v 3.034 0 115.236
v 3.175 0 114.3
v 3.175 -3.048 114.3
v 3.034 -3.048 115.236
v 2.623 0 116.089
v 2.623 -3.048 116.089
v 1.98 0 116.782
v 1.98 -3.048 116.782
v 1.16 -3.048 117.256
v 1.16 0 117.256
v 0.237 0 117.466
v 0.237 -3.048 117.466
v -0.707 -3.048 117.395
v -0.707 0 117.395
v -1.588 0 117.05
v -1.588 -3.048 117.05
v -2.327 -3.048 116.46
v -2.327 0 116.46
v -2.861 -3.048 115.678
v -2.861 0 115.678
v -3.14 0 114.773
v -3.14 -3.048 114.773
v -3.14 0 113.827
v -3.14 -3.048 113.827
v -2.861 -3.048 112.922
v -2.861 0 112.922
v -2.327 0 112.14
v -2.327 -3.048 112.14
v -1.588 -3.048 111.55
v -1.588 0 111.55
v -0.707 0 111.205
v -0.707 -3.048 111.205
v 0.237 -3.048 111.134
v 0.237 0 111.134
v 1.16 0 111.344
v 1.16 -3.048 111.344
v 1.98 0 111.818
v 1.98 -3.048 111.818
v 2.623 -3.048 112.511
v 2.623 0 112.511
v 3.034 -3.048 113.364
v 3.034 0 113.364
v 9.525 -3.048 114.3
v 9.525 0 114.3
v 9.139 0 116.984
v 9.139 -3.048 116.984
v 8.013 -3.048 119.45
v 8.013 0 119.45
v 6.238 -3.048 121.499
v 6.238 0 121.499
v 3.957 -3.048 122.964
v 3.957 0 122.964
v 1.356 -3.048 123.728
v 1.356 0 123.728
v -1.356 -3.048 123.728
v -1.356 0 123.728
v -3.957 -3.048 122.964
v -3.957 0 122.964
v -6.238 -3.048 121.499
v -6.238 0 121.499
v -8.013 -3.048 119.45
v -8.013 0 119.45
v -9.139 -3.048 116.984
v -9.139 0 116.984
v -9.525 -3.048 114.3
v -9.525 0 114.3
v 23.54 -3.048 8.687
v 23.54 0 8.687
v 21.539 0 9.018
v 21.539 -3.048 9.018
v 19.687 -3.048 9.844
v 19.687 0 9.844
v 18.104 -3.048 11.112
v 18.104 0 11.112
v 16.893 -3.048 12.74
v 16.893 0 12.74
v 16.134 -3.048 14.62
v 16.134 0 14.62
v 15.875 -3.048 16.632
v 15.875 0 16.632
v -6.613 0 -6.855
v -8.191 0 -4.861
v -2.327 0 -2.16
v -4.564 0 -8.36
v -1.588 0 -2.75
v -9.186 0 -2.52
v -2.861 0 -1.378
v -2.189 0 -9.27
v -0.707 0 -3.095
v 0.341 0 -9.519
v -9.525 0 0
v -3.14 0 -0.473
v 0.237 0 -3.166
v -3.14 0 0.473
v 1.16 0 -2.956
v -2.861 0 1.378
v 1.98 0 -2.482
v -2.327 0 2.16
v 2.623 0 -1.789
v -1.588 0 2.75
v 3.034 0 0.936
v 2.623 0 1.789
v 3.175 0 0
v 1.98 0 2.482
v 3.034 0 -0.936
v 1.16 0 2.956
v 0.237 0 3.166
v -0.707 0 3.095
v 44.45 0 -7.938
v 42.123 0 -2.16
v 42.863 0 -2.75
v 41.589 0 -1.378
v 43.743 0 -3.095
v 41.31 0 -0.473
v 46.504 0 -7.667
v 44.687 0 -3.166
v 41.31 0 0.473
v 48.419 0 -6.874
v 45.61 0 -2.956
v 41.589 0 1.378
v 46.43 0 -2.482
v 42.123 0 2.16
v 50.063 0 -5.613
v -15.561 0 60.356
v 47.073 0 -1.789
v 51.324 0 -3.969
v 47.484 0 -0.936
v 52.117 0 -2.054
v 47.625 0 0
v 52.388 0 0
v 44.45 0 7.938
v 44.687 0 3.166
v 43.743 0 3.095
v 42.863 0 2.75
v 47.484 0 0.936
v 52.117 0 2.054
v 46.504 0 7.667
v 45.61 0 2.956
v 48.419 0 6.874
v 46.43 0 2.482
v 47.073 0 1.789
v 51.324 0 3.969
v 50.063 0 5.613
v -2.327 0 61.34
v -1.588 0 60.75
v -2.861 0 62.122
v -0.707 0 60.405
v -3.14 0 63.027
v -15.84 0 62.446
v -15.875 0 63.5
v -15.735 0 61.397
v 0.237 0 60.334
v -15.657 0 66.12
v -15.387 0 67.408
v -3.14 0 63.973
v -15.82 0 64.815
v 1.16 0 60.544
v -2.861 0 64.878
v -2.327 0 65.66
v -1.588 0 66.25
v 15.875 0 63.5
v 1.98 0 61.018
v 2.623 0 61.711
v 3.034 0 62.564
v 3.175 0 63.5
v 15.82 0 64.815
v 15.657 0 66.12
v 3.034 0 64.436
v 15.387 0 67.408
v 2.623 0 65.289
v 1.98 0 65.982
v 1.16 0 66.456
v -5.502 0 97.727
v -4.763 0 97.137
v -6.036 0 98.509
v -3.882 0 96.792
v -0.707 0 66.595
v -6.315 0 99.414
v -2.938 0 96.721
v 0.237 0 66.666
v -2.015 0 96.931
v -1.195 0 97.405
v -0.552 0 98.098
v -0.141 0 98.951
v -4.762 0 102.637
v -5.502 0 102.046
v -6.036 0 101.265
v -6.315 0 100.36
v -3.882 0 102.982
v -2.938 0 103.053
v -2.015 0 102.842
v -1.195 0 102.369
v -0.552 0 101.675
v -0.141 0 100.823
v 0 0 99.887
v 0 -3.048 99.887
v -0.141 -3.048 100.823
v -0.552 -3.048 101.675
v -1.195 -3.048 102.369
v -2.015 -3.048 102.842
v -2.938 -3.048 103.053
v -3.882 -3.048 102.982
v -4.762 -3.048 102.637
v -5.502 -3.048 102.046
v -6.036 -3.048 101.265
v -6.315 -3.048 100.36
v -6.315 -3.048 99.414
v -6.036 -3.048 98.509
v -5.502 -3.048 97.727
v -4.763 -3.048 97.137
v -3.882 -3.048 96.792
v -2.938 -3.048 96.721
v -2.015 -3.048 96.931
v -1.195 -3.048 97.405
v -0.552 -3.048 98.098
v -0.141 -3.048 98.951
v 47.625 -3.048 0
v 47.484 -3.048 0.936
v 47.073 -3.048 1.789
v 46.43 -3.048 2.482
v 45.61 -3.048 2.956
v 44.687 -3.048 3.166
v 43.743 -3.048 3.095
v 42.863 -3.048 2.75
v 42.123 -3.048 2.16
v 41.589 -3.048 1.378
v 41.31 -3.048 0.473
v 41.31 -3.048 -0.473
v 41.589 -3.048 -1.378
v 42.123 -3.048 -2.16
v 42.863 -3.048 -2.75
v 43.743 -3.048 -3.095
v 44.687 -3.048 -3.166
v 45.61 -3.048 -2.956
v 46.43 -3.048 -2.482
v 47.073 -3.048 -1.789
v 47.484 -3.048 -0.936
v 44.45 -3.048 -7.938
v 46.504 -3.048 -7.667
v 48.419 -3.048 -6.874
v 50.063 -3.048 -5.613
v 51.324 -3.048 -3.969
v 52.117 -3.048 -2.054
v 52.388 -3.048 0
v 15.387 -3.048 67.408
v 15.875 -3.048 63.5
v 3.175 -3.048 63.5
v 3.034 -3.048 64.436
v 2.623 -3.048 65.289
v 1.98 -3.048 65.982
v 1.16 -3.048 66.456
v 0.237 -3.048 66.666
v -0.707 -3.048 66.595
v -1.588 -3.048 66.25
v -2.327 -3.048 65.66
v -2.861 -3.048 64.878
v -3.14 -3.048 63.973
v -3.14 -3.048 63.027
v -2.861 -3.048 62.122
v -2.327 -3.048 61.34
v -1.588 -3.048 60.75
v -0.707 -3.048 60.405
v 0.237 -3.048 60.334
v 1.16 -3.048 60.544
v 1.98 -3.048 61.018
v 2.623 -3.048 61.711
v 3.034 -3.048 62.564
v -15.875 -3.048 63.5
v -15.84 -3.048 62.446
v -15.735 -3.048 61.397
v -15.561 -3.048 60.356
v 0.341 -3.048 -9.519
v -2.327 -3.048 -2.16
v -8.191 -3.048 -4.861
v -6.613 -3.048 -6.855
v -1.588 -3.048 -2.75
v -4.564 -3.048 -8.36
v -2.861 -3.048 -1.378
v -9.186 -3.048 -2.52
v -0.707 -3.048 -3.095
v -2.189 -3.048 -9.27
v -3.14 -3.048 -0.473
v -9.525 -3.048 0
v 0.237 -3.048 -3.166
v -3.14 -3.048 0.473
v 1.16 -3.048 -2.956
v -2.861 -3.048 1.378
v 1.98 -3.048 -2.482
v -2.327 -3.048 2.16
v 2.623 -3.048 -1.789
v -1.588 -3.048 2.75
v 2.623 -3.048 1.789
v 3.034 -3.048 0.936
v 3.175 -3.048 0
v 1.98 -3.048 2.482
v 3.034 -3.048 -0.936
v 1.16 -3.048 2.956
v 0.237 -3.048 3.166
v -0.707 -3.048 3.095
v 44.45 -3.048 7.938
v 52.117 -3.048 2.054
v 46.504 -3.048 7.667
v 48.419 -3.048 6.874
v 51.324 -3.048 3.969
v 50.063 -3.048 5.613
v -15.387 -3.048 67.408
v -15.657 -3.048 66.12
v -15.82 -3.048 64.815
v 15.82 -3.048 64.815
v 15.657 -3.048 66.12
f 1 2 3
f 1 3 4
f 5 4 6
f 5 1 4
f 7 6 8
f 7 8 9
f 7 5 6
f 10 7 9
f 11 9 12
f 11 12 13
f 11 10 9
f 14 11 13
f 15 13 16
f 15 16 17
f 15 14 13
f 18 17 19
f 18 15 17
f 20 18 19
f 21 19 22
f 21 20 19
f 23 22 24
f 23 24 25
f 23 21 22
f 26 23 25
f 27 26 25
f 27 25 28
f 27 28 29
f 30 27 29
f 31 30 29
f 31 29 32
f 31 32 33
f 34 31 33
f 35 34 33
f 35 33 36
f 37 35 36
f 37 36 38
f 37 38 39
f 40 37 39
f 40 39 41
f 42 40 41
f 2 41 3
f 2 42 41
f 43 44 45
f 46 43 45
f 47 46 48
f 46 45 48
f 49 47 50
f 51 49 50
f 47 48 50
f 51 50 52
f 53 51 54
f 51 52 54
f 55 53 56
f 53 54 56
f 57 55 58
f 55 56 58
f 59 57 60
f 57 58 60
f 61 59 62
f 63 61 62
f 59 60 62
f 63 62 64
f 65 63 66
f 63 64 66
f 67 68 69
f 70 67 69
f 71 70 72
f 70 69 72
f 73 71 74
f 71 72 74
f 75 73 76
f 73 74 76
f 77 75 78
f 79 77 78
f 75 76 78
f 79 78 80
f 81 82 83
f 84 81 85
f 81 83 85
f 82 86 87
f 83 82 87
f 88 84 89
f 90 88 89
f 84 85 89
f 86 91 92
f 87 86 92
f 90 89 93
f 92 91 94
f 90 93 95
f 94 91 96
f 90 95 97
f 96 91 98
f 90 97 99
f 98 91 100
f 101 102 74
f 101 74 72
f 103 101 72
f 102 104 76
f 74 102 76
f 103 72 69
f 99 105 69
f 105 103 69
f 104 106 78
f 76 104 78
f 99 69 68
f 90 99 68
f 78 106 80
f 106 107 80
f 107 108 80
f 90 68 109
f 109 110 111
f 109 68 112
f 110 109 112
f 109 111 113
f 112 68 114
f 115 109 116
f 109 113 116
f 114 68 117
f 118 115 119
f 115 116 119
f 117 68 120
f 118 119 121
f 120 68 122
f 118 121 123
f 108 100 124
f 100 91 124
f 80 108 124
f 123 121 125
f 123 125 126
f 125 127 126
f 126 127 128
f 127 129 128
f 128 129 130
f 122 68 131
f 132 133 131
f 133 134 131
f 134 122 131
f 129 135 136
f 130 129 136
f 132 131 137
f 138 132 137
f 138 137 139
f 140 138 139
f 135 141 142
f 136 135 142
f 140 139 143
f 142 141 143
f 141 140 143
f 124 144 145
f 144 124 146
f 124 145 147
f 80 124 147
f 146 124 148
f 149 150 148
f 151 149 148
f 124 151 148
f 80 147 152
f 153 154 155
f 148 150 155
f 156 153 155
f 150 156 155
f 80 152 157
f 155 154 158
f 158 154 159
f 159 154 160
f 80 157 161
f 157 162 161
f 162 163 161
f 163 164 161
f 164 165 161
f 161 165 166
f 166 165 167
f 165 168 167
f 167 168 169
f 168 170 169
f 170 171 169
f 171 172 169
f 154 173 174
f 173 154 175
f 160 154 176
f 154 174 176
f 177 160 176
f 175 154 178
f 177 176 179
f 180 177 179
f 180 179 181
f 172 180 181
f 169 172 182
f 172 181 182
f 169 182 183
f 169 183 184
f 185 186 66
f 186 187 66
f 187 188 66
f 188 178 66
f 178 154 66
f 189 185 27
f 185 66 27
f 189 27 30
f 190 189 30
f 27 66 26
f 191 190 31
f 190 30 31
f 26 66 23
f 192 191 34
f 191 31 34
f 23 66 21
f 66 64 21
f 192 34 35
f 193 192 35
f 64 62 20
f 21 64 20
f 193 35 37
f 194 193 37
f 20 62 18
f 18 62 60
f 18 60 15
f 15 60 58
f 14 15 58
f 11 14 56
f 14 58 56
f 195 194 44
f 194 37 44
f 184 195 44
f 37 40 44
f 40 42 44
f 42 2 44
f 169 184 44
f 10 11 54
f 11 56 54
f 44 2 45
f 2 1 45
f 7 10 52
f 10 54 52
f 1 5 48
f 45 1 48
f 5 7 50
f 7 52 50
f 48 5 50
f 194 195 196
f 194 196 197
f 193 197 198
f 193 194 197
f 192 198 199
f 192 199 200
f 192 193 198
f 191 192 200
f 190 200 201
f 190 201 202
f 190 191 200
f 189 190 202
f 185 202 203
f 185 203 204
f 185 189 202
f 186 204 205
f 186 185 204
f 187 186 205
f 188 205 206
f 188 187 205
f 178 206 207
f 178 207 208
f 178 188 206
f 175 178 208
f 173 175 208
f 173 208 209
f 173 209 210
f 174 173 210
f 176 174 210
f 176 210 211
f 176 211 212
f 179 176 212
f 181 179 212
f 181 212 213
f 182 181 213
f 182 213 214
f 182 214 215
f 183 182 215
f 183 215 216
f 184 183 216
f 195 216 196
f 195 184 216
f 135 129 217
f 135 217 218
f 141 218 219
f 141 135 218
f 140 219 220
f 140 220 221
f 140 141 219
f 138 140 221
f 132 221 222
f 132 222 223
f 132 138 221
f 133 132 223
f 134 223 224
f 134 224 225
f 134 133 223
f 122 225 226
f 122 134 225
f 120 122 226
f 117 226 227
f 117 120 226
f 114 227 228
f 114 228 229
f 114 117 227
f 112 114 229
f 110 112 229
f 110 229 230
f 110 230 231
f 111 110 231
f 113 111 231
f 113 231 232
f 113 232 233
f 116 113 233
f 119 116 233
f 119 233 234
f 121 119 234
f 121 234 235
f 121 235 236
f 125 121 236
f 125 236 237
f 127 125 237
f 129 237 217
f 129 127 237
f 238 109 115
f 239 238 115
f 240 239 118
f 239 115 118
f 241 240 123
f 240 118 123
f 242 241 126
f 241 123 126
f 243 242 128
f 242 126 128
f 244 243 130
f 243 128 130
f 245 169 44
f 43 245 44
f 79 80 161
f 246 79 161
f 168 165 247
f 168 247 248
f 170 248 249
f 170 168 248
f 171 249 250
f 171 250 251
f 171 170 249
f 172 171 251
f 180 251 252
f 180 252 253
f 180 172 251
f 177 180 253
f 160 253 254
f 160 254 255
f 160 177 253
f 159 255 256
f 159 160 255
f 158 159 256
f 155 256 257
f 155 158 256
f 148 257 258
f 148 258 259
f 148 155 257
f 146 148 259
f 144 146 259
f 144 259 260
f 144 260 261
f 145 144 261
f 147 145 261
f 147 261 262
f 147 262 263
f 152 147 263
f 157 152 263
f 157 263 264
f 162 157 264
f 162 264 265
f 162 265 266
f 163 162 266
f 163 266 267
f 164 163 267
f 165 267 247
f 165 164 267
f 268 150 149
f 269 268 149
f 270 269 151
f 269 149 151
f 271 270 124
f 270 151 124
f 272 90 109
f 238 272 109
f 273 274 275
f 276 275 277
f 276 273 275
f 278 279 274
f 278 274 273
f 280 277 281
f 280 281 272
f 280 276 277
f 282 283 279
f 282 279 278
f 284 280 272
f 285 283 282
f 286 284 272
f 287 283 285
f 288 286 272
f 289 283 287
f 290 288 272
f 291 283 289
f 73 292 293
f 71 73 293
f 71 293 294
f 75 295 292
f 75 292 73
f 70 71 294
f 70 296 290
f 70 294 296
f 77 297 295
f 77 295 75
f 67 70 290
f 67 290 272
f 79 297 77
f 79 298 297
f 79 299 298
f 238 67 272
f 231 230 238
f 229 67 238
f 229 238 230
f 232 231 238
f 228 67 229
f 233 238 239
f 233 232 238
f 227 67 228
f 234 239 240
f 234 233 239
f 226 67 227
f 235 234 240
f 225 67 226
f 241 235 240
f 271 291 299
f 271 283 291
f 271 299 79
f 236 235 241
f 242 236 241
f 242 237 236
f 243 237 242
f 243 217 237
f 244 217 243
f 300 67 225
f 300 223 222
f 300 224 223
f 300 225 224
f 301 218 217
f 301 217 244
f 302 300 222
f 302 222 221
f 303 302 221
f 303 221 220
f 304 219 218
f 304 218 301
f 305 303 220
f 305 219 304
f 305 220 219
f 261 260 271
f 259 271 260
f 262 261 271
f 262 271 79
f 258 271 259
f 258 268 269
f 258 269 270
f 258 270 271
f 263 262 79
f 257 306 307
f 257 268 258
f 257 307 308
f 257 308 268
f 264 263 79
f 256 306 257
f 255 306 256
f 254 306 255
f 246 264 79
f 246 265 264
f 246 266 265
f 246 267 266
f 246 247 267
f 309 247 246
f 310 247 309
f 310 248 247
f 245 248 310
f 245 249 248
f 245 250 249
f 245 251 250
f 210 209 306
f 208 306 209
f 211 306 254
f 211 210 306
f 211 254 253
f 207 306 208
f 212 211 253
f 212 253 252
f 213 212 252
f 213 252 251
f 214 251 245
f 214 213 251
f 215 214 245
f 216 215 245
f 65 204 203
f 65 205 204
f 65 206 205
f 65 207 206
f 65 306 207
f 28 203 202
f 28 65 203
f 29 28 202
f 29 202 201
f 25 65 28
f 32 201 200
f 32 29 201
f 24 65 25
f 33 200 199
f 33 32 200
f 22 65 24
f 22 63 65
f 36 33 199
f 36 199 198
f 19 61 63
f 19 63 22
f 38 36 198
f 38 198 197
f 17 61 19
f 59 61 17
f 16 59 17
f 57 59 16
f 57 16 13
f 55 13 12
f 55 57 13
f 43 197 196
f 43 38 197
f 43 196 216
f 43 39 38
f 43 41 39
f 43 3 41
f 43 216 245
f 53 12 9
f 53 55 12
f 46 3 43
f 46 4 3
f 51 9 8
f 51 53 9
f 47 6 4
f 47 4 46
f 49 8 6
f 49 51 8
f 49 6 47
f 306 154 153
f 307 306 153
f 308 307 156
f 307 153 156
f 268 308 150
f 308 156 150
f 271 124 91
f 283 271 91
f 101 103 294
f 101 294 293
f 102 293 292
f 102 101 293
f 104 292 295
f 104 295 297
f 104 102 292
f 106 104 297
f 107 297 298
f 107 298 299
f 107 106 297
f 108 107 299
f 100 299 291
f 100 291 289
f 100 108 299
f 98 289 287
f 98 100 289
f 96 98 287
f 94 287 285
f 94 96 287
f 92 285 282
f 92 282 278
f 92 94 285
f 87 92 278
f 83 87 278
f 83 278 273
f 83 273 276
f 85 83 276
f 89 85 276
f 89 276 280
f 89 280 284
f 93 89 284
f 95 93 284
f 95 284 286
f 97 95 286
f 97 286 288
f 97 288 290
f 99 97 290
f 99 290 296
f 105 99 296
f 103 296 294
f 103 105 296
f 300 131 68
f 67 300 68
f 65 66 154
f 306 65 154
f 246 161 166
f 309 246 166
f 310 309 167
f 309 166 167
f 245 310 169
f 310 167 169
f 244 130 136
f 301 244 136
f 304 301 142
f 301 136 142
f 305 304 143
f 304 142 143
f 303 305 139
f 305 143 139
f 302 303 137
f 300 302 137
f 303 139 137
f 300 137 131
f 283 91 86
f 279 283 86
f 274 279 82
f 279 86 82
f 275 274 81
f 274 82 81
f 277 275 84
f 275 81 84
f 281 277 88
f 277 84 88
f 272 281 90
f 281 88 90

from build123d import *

# Parameters (mm, degrees)
F0_R     = 3.175
F1_DEPTH = 3.048


with BuildPart() as f1:
    # F0 (on Front) → F1 (new body)
    with BuildSketch(Plane.XZ):
        with BuildLine():
            ThreePointArc((-9.525, 114.3), (0, 104.775), (9.525, 114.3))
            ThreePointArc((9.525, 114.3), (0, 123.825), (-9.525, 114.3))
        make_face()
        with Locations((0, 114.3)):
            Circle(F0_R, mode=Mode.SUBTRACT)
        with BuildLine():
            Line((15.3865384615, 67.4076923077), (9.525, 114.3))
            ThreePointArc((9.525, 114.3), (0, 104.775), (-9.525, 114.3))
            Line((-9.525, 114.3), (-15.3865384615, 67.4076923077))
            ThreePointArc((-15.3865384615, 67.4076923077), (0, 79.375), (15.3865384615, 67.4076923077))
        make_face()
        with Locations((-3.175, 99.886942851)):
            Circle(F0_R, mode=Mode.SUBTRACT)
        with BuildLine():
            Line((15.875, 63.5), (15.3865384615, 67.4076923077))
            ThreePointArc((15.3865384615, 67.4076923077), (0, 79.375), (-15.3865384615, 67.4076923077))
            Line((-15.3865384615, 67.4076923077), (-15.875, 63.5))
            Line((-15.875, 63.5), (-15.5606435644, 60.3564356436))
            ThreePointArc((-15.5606435644, 60.3564356436), (1.5796215395, 47.7037846054), (15.875, 63.5))
        make_face()
        with Locations((0, 63.5)):
            Circle(F0_R, mode=Mode.SUBTRACT)
        with BuildLine():
            ThreePointArc((15.875, 63.5), (15.7524112928, 65.4690514116), (15.3865384615, 67.4076923077))
            Line((15.3865384615, 67.4076923077), (15.875, 63.5))
        make_face()
        with BuildLine():
            Line((-15.875, 63.5), (-15.3865384615, 67.4076923077))
            ThreePointArc((-15.3865384615, 67.4076923077), (-15.7524112928, 65.4690514116), (-15.875, 63.5))
        make_face()
        with BuildLine():
            Line((15.875, 16.6322472884), (15.875, 63.5))
            ThreePointArc((15.875, 63.5), (1.5796215395, 47.7037846054), (-15.5606435644, 60.3564356436))
            Line((-15.5606435644, 60.3564356436), (-9.525, 0))
            ThreePointArc((-9.525, 0), (0, 9.525), (9.525, 0))
            ThreePointArc((9.525, 0), (6.8547876682, -6.6134341324), (0.3412706511, -9.5188843539))
            Line((0.3412706511, -9.5188843539), (44.45, -7.9375))
            ThreePointArc((44.45, -7.9375), (36.5125, 0), (44.45, 7.9375))
            Line((44.45, 7.9375), (23.5403527632, 8.6871518144))
            ThreePointArc((23.5403527632, 8.6871518144), (18.1037372263, 11.1122342659), (15.875, 16.6322472884))
        make_face()
        with BuildLine():
            Line((-15.5606435644, 60.3564356436), (-15.875, 63.5))
            ThreePointArc((-15.875, 63.5), (-15.7962153946, 61.9203784605), (-15.5606435644, 60.3564356436))
        make_face()
        with BuildLine():
            ThreePointArc((9.525, 0), (0, 9.525), (-9.525, 0))
            ThreePointArc((-9.525, 0), (-6.6134341324, -6.8547876682), (0.3412706511, -9.5188843539))
            ThreePointArc((0.3412706511, -9.5188843539), (6.8547876682, -6.6134341324), (9.525, 0))
        make_face()
        Circle(F0_R, mode=Mode.SUBTRACT)
        with BuildLine():
            ThreePointArc((52.3875, 0), (50.0626600757, 5.6126600757), (44.45, 7.9375))
            ThreePointArc((44.45, 7.9375), (36.5125, 0), (44.45, -7.9375))
            ThreePointArc((44.45, -7.9375), (50.0626600757, -5.6126600757), (52.3875, 0))
        make_face()
        with Locations((44.45, 0)):
            Circle(F0_R, mode=Mode.SUBTRACT)
    extrude(amount=F1_DEPTH)


solid = f1.part
